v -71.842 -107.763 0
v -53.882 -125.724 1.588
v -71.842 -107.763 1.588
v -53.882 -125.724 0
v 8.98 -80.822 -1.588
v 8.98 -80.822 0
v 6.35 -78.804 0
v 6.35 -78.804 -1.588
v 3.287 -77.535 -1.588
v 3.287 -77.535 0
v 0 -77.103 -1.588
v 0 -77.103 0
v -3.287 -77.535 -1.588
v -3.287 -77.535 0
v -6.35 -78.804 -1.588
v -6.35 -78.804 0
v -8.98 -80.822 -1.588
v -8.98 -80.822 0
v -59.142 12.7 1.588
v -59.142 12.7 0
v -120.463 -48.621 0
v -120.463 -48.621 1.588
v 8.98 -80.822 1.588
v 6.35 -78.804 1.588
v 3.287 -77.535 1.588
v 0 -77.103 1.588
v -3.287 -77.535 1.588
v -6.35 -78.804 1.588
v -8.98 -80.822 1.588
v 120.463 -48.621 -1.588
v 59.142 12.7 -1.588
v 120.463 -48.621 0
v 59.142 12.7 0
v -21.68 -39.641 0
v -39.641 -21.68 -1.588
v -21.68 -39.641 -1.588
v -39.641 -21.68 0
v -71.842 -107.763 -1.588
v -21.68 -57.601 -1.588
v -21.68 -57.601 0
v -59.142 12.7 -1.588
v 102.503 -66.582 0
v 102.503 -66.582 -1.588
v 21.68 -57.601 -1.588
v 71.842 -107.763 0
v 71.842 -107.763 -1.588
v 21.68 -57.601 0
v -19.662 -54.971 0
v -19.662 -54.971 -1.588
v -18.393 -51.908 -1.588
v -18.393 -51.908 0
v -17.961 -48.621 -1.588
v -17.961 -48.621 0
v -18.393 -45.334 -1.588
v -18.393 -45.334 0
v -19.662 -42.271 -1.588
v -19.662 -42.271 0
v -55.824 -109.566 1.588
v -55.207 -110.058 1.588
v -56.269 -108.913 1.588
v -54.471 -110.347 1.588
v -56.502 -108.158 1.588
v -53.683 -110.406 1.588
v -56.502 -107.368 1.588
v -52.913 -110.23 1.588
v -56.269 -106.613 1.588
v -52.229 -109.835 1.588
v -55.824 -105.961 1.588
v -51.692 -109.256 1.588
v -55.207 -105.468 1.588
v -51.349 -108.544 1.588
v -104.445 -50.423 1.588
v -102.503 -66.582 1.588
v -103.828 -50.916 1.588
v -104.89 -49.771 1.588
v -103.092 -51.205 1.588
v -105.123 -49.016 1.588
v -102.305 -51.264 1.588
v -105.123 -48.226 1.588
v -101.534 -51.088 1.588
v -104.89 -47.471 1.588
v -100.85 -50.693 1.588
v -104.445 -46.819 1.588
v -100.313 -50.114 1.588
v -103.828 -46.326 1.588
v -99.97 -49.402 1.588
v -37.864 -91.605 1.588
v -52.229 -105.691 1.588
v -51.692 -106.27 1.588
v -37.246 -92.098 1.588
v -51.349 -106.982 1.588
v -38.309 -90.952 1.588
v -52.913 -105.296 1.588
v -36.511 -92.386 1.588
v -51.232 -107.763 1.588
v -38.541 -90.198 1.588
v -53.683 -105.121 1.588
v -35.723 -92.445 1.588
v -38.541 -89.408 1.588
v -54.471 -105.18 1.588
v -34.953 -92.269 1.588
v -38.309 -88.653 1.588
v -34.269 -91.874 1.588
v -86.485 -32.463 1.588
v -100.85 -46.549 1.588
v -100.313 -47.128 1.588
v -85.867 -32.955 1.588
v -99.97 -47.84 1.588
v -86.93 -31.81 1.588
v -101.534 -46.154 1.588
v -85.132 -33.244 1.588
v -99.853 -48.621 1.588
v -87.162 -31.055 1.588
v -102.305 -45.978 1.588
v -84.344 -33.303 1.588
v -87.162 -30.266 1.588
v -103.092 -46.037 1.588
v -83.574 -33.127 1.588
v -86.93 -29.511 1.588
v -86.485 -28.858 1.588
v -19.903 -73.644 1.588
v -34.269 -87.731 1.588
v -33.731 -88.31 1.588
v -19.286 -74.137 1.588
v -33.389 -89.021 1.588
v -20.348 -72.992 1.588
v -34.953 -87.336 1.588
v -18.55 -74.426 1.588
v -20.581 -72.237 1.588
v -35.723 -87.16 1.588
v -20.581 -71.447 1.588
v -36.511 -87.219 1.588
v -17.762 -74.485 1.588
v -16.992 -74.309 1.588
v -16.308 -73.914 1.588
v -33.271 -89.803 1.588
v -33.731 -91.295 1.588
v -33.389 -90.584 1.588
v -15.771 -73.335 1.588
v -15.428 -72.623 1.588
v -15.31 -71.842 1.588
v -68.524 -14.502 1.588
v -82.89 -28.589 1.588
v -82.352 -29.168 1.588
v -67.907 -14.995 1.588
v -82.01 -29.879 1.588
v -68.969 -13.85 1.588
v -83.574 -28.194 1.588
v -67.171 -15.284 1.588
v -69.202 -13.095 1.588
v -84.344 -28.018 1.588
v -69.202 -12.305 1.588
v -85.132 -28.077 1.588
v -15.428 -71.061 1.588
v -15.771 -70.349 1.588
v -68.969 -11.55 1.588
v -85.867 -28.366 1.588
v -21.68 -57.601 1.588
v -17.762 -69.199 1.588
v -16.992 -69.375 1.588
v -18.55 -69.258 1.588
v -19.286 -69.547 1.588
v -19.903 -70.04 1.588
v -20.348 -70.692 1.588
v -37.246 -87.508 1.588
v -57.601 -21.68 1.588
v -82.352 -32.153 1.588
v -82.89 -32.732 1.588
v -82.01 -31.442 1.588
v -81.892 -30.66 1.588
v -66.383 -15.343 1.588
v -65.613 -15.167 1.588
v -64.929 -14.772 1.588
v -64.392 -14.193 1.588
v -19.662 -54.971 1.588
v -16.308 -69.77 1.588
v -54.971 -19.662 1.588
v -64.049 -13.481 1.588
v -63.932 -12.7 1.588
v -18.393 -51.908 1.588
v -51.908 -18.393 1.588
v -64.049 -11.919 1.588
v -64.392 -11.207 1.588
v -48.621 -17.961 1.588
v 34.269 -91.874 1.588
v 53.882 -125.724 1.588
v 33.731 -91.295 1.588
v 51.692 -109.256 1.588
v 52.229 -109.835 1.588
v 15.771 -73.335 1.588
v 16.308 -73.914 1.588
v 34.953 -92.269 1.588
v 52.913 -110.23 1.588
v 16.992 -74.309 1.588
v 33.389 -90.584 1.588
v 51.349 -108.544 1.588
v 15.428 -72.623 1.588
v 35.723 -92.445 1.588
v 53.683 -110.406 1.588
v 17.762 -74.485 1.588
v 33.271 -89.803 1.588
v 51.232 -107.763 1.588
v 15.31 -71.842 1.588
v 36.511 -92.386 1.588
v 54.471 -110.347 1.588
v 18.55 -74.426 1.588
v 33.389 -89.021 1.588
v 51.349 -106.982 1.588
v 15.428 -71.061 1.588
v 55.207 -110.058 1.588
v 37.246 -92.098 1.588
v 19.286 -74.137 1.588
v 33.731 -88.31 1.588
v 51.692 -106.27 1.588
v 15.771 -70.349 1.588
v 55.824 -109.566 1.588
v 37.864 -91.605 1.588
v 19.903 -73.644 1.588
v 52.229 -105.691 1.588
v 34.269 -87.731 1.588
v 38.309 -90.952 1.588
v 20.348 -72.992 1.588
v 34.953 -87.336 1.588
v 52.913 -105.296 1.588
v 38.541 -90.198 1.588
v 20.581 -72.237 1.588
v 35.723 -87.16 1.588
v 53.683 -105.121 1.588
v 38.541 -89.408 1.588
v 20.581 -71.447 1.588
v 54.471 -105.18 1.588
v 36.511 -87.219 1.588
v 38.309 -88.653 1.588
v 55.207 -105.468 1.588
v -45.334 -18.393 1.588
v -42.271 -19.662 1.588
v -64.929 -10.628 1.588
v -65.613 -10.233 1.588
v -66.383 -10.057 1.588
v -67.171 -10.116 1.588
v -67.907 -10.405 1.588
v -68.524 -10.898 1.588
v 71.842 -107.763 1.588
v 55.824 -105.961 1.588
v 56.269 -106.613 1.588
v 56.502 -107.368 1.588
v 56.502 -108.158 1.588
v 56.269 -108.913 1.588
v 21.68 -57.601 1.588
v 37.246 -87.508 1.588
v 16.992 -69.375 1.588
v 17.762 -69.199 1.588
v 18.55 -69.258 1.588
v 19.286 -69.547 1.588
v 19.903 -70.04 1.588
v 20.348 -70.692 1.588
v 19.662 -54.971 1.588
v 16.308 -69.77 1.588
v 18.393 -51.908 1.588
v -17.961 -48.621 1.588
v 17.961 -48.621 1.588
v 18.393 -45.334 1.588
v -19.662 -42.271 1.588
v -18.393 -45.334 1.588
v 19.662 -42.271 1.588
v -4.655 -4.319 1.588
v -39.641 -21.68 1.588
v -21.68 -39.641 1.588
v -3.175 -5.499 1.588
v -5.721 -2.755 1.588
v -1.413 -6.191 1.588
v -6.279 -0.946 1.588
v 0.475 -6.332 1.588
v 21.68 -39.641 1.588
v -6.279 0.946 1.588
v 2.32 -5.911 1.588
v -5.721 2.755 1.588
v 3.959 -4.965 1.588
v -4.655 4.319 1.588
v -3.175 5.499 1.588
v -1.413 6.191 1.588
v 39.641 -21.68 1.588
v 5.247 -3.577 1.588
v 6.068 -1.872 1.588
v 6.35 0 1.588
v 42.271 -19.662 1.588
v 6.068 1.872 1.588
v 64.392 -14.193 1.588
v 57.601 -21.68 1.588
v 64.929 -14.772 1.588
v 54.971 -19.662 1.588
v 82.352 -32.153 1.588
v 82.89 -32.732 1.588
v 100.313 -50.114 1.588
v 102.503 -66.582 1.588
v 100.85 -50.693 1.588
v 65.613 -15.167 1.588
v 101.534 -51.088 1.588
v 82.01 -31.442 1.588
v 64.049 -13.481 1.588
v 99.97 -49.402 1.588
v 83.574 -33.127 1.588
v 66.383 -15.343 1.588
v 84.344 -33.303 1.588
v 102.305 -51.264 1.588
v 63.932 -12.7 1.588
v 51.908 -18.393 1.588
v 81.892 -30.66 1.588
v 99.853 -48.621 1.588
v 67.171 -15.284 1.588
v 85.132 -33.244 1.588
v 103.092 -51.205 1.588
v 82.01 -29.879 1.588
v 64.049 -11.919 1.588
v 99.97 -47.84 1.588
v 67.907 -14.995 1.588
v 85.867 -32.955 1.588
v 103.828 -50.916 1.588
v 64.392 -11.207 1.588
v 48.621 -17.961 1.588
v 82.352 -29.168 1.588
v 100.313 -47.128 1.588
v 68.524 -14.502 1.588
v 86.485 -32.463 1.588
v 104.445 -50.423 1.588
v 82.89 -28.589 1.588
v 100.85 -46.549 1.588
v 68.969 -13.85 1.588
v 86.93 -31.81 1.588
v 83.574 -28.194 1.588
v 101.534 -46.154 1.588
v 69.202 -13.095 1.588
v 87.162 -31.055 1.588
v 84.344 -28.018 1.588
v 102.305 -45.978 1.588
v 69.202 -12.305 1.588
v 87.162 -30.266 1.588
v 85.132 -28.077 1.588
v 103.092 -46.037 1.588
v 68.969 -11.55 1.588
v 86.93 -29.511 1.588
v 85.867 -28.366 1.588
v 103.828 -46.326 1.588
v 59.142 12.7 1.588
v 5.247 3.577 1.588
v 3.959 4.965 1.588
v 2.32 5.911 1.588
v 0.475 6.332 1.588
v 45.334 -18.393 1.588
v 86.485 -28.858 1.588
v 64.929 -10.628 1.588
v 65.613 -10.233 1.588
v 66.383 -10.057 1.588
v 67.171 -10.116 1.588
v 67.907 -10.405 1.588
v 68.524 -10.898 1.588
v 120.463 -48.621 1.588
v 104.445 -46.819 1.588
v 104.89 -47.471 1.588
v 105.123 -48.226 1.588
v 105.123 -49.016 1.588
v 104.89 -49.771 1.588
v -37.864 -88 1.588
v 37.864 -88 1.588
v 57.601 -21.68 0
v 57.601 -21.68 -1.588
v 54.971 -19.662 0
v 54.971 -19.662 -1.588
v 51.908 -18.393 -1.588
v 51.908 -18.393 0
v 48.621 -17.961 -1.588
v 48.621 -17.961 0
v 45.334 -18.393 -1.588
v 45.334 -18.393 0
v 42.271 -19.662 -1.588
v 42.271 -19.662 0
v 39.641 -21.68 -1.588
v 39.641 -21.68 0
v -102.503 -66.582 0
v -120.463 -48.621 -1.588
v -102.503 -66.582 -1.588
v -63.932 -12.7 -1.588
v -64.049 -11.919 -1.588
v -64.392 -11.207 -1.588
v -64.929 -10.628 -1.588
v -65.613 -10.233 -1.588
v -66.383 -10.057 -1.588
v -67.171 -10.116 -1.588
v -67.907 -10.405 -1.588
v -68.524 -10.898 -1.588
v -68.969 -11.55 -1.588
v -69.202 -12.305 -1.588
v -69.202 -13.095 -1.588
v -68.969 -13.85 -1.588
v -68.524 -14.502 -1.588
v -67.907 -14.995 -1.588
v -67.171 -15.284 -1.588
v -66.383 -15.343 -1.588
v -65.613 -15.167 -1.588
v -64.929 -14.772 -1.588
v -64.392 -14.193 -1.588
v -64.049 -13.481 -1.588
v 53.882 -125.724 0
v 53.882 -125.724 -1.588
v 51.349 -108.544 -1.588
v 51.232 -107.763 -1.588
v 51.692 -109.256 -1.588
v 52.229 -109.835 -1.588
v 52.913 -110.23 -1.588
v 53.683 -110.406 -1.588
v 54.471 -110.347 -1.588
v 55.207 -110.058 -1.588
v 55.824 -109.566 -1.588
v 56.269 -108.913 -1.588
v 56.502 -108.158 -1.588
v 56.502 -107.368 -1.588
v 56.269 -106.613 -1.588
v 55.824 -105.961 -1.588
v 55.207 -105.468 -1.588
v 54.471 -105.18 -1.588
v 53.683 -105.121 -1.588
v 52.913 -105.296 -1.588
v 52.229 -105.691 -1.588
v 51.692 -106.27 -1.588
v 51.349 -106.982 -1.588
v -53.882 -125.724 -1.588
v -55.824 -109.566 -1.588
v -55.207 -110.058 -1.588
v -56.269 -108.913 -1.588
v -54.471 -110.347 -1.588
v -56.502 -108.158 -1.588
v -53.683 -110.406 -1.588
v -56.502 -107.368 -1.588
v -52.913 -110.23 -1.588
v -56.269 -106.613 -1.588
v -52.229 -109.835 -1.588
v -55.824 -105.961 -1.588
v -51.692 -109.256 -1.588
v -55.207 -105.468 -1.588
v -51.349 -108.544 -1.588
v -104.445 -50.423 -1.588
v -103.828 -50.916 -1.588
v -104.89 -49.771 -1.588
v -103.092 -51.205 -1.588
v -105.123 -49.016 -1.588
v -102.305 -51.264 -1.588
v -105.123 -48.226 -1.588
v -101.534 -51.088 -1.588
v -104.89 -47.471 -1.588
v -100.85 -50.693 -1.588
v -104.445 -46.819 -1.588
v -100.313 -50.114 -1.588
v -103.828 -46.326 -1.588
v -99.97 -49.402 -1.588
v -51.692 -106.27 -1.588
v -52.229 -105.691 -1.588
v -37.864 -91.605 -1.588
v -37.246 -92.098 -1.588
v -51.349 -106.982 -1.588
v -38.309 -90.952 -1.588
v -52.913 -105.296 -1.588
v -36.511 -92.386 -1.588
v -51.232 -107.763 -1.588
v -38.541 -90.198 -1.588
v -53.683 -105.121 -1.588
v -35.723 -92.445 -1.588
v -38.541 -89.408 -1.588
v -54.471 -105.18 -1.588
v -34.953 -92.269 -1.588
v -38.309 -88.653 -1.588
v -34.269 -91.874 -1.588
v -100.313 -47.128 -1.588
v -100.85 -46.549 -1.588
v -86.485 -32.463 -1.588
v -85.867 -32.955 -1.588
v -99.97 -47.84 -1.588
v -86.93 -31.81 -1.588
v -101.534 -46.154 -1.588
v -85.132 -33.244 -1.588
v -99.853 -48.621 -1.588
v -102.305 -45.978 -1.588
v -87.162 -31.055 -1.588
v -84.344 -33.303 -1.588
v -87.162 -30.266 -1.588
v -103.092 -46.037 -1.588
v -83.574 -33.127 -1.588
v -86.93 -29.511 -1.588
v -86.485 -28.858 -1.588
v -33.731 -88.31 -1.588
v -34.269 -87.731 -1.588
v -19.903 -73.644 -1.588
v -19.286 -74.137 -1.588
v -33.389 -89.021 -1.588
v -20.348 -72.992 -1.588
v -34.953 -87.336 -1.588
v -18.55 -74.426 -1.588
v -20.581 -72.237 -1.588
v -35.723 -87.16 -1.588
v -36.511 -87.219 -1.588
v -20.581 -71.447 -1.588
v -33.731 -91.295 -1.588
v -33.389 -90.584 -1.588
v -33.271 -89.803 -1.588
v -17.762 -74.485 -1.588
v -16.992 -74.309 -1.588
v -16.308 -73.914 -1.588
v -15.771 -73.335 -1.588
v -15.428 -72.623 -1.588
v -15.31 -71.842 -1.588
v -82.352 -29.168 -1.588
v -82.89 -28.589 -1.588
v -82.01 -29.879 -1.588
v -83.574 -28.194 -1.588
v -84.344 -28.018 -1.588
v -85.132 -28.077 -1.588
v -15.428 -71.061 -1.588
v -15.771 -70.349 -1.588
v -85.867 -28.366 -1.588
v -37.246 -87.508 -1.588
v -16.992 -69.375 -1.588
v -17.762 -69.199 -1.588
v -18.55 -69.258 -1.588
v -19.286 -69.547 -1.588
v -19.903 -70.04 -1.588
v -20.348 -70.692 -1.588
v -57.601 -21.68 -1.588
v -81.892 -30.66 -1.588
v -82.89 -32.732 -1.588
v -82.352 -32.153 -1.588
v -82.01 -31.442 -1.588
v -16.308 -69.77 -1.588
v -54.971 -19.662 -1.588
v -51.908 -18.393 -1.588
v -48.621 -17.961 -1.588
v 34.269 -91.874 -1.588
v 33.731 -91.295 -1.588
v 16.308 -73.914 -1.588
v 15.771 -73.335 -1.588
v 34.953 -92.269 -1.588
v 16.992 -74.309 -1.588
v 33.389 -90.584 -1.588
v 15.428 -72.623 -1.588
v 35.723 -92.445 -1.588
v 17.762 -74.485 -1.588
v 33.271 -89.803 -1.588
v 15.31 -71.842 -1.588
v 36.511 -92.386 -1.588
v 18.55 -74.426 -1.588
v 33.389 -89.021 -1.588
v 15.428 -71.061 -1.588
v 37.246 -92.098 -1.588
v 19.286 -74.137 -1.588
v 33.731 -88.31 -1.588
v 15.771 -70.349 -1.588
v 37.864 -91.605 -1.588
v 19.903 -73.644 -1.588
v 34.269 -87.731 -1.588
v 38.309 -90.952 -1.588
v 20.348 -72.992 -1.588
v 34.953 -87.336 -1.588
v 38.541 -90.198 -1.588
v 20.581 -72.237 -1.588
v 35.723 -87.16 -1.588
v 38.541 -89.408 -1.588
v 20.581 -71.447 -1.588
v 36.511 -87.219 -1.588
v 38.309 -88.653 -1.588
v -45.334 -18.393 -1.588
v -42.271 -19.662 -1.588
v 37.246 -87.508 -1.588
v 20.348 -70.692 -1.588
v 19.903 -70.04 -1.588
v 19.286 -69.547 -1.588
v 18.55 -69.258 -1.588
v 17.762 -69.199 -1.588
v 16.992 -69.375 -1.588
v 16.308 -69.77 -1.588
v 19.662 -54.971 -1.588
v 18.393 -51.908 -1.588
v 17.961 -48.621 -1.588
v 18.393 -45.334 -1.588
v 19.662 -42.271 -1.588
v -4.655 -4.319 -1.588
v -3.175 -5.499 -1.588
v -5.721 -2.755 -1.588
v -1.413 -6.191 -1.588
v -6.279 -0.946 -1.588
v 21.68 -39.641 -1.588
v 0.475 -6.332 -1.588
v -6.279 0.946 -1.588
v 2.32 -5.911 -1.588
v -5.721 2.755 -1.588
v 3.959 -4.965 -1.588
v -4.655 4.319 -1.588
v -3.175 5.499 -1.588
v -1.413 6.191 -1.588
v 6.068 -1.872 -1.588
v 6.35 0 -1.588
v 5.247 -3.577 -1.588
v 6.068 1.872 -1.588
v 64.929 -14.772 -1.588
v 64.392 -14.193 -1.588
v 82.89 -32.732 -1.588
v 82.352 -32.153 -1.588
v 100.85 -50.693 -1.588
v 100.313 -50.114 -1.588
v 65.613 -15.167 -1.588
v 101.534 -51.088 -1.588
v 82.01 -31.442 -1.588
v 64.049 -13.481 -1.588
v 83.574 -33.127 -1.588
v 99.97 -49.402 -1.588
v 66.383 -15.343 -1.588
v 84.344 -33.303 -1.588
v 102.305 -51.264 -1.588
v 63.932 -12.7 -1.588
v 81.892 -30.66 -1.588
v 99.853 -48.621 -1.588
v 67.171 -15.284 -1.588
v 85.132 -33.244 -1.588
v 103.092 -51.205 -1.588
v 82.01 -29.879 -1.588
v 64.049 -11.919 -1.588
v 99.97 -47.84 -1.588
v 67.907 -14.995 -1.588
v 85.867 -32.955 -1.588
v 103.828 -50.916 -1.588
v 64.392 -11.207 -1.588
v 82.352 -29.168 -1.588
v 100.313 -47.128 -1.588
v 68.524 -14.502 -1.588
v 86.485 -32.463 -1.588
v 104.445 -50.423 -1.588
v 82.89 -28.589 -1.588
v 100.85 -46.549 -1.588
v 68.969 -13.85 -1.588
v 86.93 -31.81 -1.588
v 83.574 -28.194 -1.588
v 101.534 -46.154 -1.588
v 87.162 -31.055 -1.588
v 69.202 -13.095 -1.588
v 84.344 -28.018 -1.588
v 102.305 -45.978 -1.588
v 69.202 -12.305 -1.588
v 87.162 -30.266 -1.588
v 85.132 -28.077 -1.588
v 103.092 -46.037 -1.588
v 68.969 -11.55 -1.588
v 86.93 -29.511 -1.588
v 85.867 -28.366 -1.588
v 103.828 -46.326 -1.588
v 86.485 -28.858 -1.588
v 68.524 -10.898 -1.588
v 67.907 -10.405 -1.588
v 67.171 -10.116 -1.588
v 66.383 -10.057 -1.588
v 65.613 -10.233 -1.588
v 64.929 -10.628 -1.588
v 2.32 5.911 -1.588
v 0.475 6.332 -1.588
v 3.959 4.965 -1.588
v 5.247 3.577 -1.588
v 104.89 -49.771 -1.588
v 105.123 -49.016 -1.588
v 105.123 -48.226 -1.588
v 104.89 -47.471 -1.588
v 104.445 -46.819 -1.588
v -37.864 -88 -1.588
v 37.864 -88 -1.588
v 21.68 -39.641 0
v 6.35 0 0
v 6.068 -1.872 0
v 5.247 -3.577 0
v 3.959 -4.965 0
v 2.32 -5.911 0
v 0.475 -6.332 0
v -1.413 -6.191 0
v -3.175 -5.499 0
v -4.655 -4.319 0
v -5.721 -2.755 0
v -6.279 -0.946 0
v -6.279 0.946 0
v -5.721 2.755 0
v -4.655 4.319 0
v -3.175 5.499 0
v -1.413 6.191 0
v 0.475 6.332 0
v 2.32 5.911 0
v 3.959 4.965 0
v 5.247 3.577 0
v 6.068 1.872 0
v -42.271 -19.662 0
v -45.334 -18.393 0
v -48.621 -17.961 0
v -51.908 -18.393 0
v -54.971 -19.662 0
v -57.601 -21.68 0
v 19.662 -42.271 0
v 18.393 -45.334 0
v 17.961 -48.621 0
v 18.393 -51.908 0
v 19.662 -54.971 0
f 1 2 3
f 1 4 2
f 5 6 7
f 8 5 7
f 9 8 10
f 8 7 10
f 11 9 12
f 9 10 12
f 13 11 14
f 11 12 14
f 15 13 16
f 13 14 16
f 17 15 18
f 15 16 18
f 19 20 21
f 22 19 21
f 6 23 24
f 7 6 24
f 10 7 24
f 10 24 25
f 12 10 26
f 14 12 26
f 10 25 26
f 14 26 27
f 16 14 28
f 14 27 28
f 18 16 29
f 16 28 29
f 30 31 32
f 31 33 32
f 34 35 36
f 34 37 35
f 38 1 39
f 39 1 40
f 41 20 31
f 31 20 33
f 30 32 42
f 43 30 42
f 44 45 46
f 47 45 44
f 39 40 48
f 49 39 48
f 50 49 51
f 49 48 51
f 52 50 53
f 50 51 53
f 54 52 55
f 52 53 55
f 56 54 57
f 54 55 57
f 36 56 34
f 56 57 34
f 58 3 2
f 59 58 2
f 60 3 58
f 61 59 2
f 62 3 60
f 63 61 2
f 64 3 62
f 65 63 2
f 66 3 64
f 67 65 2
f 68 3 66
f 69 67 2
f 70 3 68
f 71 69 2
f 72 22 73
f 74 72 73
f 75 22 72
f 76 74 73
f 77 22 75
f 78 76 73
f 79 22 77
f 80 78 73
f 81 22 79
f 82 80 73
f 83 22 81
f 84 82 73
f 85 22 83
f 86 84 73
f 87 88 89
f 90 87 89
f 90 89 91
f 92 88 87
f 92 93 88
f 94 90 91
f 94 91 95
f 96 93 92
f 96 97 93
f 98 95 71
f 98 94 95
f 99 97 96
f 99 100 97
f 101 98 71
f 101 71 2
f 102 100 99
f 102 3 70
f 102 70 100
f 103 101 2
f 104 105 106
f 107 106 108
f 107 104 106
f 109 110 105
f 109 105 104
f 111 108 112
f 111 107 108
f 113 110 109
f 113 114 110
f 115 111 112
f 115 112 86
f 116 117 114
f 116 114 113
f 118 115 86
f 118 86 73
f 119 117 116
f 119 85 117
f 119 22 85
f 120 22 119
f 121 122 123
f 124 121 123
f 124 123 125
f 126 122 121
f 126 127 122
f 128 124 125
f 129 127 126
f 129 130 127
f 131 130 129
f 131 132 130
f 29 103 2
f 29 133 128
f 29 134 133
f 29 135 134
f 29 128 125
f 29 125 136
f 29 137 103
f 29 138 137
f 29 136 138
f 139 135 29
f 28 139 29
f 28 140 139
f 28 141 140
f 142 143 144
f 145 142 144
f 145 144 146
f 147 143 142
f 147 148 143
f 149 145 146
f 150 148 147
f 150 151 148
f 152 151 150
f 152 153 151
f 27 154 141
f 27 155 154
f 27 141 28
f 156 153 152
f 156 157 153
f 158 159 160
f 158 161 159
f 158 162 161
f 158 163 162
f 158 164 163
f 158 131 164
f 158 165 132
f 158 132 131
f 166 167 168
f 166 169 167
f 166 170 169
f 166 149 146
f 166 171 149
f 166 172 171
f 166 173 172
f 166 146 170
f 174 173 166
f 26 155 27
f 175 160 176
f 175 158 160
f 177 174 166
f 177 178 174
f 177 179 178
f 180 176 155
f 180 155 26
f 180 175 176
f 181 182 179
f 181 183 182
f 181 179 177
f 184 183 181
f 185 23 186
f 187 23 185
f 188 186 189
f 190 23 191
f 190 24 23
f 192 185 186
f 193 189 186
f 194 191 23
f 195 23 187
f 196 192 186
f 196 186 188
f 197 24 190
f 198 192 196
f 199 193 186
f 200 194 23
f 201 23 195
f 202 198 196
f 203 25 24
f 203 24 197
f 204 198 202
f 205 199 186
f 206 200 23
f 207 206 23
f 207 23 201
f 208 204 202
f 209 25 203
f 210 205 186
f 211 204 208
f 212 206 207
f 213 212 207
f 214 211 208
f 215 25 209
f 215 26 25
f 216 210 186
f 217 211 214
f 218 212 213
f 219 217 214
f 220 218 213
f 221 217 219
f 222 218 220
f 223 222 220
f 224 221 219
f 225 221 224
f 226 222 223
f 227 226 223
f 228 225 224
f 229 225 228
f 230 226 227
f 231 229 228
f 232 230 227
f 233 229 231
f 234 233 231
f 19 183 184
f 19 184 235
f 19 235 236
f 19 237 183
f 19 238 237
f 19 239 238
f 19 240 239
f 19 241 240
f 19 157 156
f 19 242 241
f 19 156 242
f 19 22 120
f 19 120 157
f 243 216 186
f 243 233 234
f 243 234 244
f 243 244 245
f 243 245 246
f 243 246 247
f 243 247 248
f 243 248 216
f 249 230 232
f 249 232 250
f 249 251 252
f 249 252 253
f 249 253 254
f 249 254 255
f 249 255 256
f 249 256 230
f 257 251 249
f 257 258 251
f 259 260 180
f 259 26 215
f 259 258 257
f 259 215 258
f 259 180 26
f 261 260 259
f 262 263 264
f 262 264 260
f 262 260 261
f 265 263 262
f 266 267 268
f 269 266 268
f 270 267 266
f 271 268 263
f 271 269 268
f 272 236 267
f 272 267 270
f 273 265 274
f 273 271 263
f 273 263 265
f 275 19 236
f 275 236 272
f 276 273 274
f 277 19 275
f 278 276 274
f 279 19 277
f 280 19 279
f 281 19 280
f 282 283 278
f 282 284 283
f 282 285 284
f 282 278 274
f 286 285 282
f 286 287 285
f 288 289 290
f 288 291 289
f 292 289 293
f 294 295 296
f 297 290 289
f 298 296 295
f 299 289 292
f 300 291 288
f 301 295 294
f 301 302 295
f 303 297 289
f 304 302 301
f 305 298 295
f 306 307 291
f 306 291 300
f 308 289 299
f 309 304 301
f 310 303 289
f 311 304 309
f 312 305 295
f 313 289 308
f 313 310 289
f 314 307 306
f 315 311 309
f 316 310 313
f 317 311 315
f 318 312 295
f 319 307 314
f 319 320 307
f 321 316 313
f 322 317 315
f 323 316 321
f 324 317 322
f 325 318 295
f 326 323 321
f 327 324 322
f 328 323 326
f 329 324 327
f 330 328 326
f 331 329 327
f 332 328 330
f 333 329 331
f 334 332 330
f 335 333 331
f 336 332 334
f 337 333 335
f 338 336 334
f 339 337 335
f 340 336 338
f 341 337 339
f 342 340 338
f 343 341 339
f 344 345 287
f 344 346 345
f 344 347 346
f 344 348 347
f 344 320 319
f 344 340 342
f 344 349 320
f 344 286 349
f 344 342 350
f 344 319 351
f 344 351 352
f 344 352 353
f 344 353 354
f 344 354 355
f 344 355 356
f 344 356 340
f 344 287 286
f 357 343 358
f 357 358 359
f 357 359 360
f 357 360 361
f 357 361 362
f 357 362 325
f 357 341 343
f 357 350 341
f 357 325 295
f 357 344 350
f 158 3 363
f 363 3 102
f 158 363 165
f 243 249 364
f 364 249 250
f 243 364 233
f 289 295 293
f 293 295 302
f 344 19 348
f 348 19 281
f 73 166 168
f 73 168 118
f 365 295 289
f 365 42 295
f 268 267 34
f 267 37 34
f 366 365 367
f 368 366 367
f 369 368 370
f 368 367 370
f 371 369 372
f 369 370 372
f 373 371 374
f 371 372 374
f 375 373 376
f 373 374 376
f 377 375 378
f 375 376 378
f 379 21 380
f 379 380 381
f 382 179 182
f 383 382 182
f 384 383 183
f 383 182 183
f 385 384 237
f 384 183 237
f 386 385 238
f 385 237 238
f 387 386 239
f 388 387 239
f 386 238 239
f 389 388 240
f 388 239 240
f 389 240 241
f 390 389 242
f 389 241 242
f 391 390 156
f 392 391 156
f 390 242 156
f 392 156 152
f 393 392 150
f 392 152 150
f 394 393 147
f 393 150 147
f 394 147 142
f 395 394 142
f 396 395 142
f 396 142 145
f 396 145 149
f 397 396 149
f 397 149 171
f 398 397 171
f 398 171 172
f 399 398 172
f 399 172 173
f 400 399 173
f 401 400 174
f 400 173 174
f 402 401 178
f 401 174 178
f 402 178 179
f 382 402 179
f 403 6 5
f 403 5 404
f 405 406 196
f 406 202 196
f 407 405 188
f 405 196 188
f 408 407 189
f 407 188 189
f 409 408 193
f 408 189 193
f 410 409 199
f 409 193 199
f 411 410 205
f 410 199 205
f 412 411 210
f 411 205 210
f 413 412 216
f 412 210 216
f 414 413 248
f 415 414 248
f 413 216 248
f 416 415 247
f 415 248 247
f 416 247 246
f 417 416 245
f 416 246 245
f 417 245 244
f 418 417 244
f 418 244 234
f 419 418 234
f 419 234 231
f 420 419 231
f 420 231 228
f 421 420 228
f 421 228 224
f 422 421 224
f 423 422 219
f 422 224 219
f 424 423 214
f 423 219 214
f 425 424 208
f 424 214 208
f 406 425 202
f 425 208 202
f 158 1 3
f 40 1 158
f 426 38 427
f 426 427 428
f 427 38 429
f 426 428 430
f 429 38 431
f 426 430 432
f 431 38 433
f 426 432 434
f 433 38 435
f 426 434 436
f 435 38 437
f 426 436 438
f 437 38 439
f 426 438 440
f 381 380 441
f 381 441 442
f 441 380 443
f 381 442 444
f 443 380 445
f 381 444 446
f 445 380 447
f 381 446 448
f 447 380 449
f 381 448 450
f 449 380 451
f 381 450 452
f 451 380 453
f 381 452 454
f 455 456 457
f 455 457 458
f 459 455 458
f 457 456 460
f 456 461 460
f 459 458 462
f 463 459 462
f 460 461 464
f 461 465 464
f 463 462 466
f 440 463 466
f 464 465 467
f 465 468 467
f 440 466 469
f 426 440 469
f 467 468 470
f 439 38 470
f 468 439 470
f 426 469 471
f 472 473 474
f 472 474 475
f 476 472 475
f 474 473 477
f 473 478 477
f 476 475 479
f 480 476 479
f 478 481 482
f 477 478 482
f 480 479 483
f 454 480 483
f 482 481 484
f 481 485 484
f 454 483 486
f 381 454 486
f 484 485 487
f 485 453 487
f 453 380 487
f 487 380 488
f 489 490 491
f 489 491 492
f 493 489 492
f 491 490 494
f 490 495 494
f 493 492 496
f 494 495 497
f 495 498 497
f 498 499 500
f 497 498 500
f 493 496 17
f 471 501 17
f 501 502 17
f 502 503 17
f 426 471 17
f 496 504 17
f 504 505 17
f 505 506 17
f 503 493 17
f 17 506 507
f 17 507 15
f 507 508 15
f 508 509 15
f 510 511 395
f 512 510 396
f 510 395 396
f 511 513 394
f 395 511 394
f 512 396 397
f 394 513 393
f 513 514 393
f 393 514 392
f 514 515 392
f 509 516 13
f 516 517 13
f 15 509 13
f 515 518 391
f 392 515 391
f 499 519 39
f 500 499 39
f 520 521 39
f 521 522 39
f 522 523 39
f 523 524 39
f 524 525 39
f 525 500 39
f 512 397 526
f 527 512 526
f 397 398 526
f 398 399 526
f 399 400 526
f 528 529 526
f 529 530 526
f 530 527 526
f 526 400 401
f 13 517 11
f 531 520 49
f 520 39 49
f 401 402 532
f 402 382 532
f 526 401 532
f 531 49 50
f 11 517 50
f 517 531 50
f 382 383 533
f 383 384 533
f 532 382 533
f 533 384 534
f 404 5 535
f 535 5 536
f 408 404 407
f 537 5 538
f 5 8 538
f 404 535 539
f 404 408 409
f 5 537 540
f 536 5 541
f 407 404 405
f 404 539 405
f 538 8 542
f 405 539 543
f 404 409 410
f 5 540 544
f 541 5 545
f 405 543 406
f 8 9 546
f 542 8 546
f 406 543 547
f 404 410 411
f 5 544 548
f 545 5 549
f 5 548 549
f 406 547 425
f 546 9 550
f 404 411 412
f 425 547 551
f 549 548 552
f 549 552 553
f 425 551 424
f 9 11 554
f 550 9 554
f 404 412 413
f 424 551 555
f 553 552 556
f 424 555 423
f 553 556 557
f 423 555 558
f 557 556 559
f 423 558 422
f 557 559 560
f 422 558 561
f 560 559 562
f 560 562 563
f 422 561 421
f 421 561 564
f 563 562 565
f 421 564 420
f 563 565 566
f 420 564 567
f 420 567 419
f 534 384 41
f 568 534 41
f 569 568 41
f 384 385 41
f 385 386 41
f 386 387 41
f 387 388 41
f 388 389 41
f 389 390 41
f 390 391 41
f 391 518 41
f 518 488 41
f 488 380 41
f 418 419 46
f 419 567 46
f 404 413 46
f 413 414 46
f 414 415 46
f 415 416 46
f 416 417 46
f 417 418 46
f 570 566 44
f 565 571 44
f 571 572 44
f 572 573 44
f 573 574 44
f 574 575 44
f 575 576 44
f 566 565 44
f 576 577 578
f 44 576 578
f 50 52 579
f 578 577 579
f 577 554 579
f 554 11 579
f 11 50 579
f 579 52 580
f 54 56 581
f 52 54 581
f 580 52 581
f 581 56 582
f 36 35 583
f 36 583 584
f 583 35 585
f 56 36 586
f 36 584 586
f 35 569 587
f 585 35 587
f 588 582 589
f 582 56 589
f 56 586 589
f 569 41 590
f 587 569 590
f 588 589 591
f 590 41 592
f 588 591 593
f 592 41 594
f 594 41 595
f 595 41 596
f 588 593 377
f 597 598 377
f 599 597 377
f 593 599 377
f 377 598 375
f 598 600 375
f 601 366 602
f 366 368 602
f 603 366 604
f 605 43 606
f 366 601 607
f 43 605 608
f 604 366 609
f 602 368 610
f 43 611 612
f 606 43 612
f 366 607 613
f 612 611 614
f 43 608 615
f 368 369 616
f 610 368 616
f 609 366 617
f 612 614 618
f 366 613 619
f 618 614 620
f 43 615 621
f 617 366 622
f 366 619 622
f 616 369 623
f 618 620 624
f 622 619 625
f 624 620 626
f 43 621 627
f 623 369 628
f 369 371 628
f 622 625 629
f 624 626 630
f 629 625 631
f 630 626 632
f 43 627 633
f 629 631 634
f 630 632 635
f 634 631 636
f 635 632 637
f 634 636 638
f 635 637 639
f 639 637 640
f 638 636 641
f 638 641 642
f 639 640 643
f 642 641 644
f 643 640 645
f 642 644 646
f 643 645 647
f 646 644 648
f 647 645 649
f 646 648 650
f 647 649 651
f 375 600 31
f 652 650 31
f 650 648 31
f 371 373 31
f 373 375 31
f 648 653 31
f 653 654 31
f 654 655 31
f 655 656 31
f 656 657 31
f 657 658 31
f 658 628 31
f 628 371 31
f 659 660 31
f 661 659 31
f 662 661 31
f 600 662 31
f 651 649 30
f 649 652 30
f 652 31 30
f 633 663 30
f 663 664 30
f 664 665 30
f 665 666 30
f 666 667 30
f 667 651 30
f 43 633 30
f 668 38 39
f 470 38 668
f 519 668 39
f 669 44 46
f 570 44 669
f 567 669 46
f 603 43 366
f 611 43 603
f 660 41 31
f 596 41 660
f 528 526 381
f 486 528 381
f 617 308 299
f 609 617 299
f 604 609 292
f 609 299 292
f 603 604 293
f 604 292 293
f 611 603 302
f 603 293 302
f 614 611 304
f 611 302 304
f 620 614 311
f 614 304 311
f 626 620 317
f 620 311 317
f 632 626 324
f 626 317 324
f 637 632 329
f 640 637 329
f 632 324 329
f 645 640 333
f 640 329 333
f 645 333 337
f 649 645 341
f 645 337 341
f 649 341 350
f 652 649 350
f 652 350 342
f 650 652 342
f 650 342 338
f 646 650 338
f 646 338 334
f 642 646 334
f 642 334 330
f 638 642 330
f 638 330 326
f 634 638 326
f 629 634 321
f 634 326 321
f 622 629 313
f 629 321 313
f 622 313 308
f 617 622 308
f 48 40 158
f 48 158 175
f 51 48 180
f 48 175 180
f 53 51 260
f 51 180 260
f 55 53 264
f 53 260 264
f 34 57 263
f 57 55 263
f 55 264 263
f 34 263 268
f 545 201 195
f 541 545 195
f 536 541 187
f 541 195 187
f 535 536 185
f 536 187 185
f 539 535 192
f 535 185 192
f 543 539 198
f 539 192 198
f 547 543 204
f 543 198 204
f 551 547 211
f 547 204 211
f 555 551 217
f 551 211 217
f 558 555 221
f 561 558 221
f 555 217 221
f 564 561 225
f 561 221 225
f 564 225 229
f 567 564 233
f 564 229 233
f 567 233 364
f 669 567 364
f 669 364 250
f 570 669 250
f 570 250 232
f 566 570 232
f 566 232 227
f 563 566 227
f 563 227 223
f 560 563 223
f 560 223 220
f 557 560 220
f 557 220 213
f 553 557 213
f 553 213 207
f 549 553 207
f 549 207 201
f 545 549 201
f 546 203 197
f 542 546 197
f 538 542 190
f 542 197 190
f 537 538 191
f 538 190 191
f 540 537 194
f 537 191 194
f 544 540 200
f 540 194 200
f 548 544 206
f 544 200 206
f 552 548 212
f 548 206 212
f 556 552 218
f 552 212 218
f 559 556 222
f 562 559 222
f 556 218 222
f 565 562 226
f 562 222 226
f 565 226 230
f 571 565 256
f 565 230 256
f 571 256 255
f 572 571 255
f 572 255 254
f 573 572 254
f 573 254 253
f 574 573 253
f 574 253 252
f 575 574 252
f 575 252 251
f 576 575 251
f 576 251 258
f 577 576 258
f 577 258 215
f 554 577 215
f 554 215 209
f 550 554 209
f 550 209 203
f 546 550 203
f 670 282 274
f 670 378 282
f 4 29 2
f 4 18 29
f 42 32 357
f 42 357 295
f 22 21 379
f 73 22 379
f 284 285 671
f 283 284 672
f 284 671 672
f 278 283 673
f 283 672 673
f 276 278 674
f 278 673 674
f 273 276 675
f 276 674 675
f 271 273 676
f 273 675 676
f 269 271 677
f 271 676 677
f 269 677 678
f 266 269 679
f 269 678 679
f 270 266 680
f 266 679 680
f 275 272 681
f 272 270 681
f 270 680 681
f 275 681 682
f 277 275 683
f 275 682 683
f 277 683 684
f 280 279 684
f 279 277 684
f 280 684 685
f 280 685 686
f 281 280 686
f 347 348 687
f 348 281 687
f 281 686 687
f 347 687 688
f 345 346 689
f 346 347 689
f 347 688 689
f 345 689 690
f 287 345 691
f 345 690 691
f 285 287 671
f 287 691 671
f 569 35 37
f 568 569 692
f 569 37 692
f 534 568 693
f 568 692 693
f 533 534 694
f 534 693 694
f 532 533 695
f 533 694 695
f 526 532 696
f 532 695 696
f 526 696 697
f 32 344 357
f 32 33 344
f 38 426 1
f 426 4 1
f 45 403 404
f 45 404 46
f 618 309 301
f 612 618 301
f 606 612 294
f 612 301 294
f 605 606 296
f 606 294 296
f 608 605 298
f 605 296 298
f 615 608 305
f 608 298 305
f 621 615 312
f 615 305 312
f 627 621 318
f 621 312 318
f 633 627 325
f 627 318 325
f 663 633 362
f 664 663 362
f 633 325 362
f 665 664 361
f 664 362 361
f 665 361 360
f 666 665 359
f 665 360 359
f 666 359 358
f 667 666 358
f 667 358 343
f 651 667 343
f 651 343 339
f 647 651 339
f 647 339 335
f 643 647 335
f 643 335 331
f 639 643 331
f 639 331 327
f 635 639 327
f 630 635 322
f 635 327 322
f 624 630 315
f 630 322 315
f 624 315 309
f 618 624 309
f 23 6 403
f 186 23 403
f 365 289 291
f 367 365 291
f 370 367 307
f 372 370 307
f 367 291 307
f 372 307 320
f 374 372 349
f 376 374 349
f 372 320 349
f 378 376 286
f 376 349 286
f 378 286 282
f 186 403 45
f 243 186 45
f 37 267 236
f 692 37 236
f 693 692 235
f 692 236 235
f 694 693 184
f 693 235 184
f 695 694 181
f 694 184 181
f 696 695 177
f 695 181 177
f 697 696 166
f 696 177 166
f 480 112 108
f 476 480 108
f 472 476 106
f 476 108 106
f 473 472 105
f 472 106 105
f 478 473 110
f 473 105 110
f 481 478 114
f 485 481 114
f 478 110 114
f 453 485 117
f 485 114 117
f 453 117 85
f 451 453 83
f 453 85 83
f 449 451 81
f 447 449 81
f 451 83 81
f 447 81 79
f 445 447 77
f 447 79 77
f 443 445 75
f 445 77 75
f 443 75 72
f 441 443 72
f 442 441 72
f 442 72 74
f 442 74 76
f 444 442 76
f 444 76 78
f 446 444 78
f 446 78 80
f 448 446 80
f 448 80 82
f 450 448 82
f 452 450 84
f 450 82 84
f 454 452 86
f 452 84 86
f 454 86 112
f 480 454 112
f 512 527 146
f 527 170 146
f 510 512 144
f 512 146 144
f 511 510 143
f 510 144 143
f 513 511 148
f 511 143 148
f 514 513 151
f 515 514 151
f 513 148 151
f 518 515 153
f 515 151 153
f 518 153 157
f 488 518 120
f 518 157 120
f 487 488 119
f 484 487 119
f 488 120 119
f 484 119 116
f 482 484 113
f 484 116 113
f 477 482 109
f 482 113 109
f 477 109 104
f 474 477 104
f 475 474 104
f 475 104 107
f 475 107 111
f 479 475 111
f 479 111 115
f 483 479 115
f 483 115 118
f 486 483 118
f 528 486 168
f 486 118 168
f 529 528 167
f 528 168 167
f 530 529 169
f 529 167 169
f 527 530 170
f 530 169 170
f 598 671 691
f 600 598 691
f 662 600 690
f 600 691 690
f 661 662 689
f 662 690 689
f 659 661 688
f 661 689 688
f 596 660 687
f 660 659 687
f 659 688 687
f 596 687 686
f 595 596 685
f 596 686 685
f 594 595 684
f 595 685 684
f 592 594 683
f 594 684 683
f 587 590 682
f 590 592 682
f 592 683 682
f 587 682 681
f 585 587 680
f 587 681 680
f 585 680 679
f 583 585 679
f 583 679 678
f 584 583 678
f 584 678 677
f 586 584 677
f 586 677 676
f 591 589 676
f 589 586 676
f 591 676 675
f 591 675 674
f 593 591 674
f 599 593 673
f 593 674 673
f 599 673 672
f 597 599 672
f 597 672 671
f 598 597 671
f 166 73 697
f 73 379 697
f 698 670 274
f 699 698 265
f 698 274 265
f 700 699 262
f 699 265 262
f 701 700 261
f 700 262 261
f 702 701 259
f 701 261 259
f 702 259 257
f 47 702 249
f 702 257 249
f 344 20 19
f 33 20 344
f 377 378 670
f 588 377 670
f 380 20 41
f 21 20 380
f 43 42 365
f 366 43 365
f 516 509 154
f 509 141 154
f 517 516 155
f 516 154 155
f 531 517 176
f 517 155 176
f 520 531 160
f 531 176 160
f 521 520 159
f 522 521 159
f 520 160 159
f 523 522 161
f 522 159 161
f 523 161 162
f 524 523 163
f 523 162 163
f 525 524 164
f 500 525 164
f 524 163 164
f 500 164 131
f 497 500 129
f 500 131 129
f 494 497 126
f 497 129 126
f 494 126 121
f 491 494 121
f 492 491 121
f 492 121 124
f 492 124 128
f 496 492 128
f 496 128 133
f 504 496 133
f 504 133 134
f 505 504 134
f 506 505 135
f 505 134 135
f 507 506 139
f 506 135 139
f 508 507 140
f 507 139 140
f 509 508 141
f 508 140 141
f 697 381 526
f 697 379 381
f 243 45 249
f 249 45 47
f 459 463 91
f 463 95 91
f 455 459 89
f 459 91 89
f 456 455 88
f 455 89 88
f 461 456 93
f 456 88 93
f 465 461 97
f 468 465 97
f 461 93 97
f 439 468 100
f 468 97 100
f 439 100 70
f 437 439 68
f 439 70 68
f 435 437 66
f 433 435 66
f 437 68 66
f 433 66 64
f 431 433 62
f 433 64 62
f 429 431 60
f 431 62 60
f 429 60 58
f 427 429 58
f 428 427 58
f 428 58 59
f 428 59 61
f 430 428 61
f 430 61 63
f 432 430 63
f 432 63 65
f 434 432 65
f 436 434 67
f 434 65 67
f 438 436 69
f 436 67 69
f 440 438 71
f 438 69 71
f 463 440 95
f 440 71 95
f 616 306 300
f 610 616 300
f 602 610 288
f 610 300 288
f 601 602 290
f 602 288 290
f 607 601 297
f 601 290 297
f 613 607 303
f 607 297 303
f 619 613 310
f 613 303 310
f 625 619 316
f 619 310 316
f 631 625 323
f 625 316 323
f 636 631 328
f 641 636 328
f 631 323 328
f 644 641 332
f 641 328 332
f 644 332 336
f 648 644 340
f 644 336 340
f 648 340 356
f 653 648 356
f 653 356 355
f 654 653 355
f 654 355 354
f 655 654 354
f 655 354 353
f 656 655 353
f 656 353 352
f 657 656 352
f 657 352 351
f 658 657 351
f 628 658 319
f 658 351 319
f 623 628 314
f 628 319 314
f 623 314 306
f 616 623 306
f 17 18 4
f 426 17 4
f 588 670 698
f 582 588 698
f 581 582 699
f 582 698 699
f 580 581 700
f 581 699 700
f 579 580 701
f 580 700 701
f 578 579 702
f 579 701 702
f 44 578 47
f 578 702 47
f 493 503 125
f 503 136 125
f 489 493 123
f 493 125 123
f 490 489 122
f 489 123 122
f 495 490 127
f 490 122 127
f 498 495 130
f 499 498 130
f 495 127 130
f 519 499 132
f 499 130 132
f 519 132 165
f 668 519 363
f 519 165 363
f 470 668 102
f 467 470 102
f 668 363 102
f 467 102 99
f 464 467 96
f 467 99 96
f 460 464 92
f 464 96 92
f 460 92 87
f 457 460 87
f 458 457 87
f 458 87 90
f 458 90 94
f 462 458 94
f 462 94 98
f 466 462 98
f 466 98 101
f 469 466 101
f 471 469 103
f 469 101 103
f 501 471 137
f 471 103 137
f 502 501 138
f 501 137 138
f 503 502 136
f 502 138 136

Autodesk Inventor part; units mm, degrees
ref_plane "YZ Plane" through (0, 0, 0) normal (1, 0, 0) x (0, 1, 0)
ref_plane "XZ Plane" through (0, 0, 0) normal (0, 1, 0) x (-1, 0, 0)
ref_plane "XY Plane" through (0, 0, 0) normal (0, 0, 1) x (1, 0, 0)
sketch "Sketch8" plane through (0, 0, 0) normal (0, 0, 1) x (1, 0, 0)
  circle A0 centre (0, 0) radius 6.35
  line L0 (0, -153.4083) -> (0, 40.3847) projected
  line L1 (0, 12.7) -> (59.142, 12.7)
  line L2 (59.142, 12.7) -> (120.4631, -48.621)
  line L3 (120.4631, -48.621) -> (102.5026, -66.5815)
  line L4 (102.5026, -66.5815) -> (48.621, -12.7)
  line L5 (0, 0) -> (88.4811, -88.4811) construction
  line L6 (48.621, -12.7) -> (12.7, -48.621)
  line L7 (0, 12.7) -> (-59.142, 12.7)
  line L8 (-59.142, 12.7) -> (-120.4631, -48.621)
  line L9 (-120.4631, -48.621) -> (-102.5026, -66.5815)
  line L10 (-102.5026, -66.5815) -> (-48.621, -12.7)
  line L11 (0, 0) -> (-88.4811, -88.4811) construction
  line L12 (-48.621, -12.7) -> (-12.7, -48.621)
  line L13 (0, -71.842) -> (53.8815, -125.7236)
  line L14 (53.8815, -125.7236) -> (71.842, -107.7631)
  line L15 (71.842, -107.7631) -> (12.7, -48.621)
  line L16 (0, -71.842) -> (-53.8815, -125.7236)
  line L17 (-53.8815, -125.7236) -> (-71.842, -107.7631)
  line L18 (-71.842, -107.7631) -> (-12.7, -48.621)
  dimension "d108" = 12.7
  dimension "d110" = 25.4
  dimension "d111" = 76.2
  dimension "d112" = 12.7
  dimension "d113" = 12.7
  dimension "d114" = 50.8
  dimension "d115" = 135
  dimension "d131" = 76.2
  dimension "d133" = 25.4
extrude "Extrusion6" add sketch "Sketch8" along normal mid plane 3.175 contours A0 L0 L1 L2 L3 L4 L6 L15 L14 L13 | A0 L0 L16 L17 L18 L12 L10 L9 L8 L7
sketch "Sketch9" plane through (0, 0, 1.5875) normal (0, 0, 1) x (1, 0, 0)
  line L0 (-59.142, 12.7) -> (-120.4631, -48.621) projected
  line L1 (-102.5026, -66.5815) -> (-48.621, -12.7) projected
  line L2 (-120.4631, -66.5815) -> (0, 53.8815) construction
  line L3 (0, -161.6446) -> (0, 89.8026) construction
  circle A0 centre (-102.5026, -48.621) radius 2.65
  line L4 (-120.4631, -48.621) -> (-102.5026, -66.5815) construction
  circle A1 centre (-84.542, -30.6605) radius 2.65
  circle A2 centre (-66.5815, -12.7) radius 2.65
  line L5 (-93.5249, -93.5249) -> (0, 0) construction
  line L6 (-71.842, -125.7236) -> (0, -53.8815) construction
  line L7 (-12.7, -48.621) -> (-71.842, -107.7631) construction
  circle A3 centre (-53.8815, -107.7631) radius 2.65
  line L8 (-71.842, -107.7631) -> (-53.8815, -125.7236) construction
  circle A4 centre (-35.921, -89.8026) radius 2.65
  circle A5 centre (-17.9605, -71.842) radius 2.65
  dimension "d119" = 45
  dimension "d120" = 12.7
  dimension "d121" = 5.3
  dimension "d124" = 25.4
  dimension "d134" = 5.3
  dimension "d135" = 12.7
  dimension "d138" = 25.4
extrude "Extrusion7" cut sketch "Sketch9" against normal blind 25.4
mirror "Mirror3" about plane through (0, 0, 0) normal (1, 0, 0) of "Extrusion7"
fillet "Fillet4" radius 12.7 5 edges at (-48.621, -12.7, 0) (48.621, -12.7, 0) (0, -71.842, 0) (-12.7, -48.621, 0) (12.7, -48.621, 0)
equation "\"topDiameter\" = 45"
equation "\"bearingDiameter\" = 28.62"
equation "\"plateThickness\" = 6.35"
equation "\"theta12\" = 90deg"
equation "\"gearboxLength\" = 101.6"
equation "\"boltedLength\" = 76.2"
equation "\"topDiameter_1\" = 25"
equation "\"shaftLength_1\" = 76.2"
equation "\"bearingDiameter_1\" = 28.62"
equation "\"plateThickness_1\" = 6.35"
equation "\"theta12_1\" = 100deg"
equation "\"boltDiameter_1\" = 6"
equation "\"gearboxLength_1\" = 101.6"
equation "\"boltedLength_1\" = 76.2"
equation "\"innerBoltSpacing_1\" = 12.7"
equation "\"outerBoltSpacing_1\" = 12.7"
equation "\"shaftLength\" = 76.2"
equation "\"boltDiameter\" = 5.3"
equation "\"outerBoltSpacing\" = 12.7"
equation "\"innerBoltSpacing\" = 12.7"
properties part number "KneePivotPlate" material "Aluminum 6061"
